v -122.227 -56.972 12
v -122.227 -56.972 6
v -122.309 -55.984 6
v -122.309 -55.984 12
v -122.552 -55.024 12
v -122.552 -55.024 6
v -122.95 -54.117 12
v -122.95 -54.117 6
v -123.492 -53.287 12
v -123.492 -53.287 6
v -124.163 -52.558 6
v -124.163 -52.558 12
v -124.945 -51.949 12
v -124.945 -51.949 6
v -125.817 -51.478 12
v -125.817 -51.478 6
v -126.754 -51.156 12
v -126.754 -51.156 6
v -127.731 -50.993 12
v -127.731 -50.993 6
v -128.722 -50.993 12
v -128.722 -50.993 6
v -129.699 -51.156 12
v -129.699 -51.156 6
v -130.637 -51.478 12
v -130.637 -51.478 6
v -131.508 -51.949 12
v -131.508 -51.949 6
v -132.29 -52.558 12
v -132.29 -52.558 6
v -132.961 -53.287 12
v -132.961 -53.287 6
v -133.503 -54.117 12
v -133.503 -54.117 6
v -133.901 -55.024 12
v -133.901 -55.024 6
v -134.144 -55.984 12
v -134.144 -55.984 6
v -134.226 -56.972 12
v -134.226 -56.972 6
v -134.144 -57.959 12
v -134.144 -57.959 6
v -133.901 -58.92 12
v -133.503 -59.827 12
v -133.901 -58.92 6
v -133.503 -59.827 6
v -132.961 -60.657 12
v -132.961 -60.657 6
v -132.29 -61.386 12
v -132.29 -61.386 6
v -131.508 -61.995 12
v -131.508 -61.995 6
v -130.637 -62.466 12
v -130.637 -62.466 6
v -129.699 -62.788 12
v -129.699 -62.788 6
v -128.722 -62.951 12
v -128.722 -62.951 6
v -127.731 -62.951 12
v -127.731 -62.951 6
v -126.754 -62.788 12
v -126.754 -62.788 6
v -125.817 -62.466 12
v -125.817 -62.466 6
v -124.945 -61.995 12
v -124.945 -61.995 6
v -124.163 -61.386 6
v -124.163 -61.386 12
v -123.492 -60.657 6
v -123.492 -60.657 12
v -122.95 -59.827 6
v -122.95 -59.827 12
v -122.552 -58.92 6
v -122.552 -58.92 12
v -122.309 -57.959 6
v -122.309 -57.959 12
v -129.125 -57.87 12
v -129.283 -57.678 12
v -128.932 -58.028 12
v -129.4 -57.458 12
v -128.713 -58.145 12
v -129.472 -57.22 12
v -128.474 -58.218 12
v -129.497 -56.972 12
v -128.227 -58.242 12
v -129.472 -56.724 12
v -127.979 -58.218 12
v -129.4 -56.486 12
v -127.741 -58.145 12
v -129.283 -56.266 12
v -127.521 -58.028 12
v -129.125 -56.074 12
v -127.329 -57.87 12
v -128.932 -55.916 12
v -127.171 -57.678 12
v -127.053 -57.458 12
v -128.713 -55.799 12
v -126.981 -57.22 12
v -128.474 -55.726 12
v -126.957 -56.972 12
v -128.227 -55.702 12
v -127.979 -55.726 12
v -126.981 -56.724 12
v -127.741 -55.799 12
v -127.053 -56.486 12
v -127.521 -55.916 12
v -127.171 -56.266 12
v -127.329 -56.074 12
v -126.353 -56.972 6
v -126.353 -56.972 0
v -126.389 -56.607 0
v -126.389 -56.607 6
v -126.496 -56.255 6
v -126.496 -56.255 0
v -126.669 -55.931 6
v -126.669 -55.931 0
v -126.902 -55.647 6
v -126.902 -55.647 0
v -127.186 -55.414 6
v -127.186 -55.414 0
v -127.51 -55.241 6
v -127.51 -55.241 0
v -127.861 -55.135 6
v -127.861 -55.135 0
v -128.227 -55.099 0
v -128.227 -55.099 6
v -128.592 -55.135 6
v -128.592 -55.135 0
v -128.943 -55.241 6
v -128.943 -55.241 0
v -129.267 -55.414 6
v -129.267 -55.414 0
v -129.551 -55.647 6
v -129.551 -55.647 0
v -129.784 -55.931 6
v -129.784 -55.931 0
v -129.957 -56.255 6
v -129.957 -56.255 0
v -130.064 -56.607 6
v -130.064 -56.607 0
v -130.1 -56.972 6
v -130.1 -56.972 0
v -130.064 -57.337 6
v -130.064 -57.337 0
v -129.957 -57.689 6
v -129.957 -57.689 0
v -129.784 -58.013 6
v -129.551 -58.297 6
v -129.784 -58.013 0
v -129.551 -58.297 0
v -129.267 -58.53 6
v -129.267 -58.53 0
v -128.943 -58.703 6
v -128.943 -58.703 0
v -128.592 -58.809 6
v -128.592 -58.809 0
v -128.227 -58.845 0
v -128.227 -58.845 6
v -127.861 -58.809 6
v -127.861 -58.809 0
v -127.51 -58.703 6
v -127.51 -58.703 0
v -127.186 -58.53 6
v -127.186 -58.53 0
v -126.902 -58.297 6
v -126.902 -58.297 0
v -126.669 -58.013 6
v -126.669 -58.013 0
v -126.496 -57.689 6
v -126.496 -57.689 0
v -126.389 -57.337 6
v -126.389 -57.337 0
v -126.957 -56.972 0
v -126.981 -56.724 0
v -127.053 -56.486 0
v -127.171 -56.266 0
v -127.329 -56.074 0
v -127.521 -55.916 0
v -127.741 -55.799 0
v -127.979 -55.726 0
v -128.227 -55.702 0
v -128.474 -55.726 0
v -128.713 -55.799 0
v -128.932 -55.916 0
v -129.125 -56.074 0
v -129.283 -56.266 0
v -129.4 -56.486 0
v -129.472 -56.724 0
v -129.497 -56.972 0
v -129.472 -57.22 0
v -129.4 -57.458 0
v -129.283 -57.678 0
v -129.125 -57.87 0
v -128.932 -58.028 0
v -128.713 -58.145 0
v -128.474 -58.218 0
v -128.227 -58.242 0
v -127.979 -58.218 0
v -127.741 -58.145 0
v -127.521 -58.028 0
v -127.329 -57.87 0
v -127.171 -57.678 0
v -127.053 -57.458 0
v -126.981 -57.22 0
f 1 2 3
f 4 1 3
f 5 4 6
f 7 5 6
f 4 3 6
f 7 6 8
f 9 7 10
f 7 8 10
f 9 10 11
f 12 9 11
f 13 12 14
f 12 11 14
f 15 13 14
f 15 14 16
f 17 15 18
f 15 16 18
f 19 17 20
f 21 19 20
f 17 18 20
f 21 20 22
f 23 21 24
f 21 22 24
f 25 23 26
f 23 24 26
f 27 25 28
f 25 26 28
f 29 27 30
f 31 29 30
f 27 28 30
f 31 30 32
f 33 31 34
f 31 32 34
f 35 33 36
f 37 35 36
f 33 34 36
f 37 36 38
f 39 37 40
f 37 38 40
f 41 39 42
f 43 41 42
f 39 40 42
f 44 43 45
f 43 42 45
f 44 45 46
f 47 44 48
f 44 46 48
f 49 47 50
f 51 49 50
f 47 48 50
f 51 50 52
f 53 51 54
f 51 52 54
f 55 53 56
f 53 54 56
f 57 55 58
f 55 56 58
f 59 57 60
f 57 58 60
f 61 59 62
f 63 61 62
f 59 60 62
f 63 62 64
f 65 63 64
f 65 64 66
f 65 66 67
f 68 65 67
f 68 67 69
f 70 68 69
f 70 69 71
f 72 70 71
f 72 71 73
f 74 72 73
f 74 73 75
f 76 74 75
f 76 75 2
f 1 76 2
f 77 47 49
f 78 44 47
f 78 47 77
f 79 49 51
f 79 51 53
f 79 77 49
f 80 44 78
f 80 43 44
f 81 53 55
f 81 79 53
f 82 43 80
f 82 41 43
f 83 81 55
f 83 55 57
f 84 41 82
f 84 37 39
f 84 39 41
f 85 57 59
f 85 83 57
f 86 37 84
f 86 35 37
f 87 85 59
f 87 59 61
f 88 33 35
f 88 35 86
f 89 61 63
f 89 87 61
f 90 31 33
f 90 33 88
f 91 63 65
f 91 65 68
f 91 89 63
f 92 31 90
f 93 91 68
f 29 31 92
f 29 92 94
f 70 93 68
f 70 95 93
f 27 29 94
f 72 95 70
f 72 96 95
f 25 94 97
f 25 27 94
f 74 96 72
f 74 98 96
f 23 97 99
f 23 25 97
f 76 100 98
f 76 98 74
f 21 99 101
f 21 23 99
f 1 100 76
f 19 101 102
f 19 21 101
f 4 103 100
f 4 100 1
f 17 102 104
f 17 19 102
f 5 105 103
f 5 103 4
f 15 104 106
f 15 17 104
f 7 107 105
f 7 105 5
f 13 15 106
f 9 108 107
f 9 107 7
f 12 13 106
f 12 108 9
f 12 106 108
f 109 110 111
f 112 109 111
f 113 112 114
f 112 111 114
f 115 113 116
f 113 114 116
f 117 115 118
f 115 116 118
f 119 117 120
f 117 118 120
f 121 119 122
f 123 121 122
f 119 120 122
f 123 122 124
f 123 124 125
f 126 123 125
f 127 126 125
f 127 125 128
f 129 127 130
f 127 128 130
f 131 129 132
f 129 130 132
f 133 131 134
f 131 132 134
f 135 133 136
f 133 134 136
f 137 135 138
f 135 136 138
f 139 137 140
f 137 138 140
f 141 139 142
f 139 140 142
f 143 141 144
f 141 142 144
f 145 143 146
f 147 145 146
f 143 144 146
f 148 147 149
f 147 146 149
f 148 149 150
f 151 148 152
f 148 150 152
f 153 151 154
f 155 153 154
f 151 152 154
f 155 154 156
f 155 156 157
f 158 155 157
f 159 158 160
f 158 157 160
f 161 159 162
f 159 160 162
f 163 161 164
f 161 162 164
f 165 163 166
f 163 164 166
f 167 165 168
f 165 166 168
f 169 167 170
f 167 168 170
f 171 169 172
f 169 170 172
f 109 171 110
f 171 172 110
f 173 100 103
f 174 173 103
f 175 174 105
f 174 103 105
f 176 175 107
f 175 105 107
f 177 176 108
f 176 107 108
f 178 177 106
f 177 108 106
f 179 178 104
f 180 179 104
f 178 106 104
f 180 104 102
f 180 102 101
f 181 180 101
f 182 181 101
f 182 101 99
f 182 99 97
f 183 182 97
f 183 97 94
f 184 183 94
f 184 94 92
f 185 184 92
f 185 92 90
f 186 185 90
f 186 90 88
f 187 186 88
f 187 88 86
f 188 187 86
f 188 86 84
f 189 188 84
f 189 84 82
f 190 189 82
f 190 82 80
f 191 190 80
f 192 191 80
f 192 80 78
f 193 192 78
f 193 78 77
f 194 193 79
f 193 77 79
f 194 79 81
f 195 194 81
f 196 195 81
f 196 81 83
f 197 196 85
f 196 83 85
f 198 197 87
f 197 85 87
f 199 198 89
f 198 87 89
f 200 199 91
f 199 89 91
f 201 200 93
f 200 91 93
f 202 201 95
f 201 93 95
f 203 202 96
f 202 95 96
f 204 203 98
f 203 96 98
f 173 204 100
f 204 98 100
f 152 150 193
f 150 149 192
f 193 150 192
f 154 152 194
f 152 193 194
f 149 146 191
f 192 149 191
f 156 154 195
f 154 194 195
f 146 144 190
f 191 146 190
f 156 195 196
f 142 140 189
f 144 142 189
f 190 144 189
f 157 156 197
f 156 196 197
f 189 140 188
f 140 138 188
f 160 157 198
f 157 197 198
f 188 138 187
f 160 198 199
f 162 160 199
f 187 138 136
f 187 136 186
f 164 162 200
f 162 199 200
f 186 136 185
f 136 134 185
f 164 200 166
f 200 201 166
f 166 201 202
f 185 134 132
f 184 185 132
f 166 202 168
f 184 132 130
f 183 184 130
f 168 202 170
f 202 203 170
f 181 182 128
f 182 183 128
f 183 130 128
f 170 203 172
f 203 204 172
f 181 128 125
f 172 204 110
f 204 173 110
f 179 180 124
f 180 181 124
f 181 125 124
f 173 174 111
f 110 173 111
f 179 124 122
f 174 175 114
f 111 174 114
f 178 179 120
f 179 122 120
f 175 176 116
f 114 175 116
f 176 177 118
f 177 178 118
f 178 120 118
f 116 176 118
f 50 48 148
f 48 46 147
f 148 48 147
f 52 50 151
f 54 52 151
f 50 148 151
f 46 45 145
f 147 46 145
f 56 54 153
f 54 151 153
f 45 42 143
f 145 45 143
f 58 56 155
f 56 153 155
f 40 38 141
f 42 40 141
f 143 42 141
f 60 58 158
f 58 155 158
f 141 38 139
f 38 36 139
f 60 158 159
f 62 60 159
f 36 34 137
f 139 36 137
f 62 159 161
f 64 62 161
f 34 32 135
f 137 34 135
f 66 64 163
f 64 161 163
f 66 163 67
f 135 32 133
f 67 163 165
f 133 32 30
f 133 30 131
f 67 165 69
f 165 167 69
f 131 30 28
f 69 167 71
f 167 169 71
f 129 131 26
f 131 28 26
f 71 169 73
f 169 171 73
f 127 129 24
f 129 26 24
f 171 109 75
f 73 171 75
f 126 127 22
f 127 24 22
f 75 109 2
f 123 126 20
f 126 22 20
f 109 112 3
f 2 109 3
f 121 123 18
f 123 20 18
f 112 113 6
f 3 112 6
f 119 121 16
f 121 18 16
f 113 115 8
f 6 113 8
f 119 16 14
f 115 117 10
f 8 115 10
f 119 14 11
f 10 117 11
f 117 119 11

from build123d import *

# Parameters (mm, degrees)
F0_R     = 1.87325
F1_DEPTH = 5.999988
F2_R     = 5.99948
F3_DEPTH = 5.999988
F4_R     = 1.27
F5_DEPTH = 12.000976


with BuildPart() as f1:
    # F0 (on Top) → F1 (new body)
    with BuildSketch(Plane.XY):
        with Locations((-128.226578, -56.971956)):
            Circle(F0_R)
    extrude(amount=F1_DEPTH)

    # F2 (on face) → F3 (join)
    with BuildSketch(Plane.XY.offset(5.999988)):
        with Locations((-128.226578, -56.971956)):
            Circle(F2_R)
    extrude(amount=F3_DEPTH)

    # F4 (on face) → F5 (cut, through all)
    with BuildSketch(Plane.XY.offset(11.999976)):
        with Locations((-128.226578, -56.971956)):
            Circle(F4_R)
    extrude(amount=-F5_DEPTH, mode=Mode.SUBTRACT)


solid = f1.part
